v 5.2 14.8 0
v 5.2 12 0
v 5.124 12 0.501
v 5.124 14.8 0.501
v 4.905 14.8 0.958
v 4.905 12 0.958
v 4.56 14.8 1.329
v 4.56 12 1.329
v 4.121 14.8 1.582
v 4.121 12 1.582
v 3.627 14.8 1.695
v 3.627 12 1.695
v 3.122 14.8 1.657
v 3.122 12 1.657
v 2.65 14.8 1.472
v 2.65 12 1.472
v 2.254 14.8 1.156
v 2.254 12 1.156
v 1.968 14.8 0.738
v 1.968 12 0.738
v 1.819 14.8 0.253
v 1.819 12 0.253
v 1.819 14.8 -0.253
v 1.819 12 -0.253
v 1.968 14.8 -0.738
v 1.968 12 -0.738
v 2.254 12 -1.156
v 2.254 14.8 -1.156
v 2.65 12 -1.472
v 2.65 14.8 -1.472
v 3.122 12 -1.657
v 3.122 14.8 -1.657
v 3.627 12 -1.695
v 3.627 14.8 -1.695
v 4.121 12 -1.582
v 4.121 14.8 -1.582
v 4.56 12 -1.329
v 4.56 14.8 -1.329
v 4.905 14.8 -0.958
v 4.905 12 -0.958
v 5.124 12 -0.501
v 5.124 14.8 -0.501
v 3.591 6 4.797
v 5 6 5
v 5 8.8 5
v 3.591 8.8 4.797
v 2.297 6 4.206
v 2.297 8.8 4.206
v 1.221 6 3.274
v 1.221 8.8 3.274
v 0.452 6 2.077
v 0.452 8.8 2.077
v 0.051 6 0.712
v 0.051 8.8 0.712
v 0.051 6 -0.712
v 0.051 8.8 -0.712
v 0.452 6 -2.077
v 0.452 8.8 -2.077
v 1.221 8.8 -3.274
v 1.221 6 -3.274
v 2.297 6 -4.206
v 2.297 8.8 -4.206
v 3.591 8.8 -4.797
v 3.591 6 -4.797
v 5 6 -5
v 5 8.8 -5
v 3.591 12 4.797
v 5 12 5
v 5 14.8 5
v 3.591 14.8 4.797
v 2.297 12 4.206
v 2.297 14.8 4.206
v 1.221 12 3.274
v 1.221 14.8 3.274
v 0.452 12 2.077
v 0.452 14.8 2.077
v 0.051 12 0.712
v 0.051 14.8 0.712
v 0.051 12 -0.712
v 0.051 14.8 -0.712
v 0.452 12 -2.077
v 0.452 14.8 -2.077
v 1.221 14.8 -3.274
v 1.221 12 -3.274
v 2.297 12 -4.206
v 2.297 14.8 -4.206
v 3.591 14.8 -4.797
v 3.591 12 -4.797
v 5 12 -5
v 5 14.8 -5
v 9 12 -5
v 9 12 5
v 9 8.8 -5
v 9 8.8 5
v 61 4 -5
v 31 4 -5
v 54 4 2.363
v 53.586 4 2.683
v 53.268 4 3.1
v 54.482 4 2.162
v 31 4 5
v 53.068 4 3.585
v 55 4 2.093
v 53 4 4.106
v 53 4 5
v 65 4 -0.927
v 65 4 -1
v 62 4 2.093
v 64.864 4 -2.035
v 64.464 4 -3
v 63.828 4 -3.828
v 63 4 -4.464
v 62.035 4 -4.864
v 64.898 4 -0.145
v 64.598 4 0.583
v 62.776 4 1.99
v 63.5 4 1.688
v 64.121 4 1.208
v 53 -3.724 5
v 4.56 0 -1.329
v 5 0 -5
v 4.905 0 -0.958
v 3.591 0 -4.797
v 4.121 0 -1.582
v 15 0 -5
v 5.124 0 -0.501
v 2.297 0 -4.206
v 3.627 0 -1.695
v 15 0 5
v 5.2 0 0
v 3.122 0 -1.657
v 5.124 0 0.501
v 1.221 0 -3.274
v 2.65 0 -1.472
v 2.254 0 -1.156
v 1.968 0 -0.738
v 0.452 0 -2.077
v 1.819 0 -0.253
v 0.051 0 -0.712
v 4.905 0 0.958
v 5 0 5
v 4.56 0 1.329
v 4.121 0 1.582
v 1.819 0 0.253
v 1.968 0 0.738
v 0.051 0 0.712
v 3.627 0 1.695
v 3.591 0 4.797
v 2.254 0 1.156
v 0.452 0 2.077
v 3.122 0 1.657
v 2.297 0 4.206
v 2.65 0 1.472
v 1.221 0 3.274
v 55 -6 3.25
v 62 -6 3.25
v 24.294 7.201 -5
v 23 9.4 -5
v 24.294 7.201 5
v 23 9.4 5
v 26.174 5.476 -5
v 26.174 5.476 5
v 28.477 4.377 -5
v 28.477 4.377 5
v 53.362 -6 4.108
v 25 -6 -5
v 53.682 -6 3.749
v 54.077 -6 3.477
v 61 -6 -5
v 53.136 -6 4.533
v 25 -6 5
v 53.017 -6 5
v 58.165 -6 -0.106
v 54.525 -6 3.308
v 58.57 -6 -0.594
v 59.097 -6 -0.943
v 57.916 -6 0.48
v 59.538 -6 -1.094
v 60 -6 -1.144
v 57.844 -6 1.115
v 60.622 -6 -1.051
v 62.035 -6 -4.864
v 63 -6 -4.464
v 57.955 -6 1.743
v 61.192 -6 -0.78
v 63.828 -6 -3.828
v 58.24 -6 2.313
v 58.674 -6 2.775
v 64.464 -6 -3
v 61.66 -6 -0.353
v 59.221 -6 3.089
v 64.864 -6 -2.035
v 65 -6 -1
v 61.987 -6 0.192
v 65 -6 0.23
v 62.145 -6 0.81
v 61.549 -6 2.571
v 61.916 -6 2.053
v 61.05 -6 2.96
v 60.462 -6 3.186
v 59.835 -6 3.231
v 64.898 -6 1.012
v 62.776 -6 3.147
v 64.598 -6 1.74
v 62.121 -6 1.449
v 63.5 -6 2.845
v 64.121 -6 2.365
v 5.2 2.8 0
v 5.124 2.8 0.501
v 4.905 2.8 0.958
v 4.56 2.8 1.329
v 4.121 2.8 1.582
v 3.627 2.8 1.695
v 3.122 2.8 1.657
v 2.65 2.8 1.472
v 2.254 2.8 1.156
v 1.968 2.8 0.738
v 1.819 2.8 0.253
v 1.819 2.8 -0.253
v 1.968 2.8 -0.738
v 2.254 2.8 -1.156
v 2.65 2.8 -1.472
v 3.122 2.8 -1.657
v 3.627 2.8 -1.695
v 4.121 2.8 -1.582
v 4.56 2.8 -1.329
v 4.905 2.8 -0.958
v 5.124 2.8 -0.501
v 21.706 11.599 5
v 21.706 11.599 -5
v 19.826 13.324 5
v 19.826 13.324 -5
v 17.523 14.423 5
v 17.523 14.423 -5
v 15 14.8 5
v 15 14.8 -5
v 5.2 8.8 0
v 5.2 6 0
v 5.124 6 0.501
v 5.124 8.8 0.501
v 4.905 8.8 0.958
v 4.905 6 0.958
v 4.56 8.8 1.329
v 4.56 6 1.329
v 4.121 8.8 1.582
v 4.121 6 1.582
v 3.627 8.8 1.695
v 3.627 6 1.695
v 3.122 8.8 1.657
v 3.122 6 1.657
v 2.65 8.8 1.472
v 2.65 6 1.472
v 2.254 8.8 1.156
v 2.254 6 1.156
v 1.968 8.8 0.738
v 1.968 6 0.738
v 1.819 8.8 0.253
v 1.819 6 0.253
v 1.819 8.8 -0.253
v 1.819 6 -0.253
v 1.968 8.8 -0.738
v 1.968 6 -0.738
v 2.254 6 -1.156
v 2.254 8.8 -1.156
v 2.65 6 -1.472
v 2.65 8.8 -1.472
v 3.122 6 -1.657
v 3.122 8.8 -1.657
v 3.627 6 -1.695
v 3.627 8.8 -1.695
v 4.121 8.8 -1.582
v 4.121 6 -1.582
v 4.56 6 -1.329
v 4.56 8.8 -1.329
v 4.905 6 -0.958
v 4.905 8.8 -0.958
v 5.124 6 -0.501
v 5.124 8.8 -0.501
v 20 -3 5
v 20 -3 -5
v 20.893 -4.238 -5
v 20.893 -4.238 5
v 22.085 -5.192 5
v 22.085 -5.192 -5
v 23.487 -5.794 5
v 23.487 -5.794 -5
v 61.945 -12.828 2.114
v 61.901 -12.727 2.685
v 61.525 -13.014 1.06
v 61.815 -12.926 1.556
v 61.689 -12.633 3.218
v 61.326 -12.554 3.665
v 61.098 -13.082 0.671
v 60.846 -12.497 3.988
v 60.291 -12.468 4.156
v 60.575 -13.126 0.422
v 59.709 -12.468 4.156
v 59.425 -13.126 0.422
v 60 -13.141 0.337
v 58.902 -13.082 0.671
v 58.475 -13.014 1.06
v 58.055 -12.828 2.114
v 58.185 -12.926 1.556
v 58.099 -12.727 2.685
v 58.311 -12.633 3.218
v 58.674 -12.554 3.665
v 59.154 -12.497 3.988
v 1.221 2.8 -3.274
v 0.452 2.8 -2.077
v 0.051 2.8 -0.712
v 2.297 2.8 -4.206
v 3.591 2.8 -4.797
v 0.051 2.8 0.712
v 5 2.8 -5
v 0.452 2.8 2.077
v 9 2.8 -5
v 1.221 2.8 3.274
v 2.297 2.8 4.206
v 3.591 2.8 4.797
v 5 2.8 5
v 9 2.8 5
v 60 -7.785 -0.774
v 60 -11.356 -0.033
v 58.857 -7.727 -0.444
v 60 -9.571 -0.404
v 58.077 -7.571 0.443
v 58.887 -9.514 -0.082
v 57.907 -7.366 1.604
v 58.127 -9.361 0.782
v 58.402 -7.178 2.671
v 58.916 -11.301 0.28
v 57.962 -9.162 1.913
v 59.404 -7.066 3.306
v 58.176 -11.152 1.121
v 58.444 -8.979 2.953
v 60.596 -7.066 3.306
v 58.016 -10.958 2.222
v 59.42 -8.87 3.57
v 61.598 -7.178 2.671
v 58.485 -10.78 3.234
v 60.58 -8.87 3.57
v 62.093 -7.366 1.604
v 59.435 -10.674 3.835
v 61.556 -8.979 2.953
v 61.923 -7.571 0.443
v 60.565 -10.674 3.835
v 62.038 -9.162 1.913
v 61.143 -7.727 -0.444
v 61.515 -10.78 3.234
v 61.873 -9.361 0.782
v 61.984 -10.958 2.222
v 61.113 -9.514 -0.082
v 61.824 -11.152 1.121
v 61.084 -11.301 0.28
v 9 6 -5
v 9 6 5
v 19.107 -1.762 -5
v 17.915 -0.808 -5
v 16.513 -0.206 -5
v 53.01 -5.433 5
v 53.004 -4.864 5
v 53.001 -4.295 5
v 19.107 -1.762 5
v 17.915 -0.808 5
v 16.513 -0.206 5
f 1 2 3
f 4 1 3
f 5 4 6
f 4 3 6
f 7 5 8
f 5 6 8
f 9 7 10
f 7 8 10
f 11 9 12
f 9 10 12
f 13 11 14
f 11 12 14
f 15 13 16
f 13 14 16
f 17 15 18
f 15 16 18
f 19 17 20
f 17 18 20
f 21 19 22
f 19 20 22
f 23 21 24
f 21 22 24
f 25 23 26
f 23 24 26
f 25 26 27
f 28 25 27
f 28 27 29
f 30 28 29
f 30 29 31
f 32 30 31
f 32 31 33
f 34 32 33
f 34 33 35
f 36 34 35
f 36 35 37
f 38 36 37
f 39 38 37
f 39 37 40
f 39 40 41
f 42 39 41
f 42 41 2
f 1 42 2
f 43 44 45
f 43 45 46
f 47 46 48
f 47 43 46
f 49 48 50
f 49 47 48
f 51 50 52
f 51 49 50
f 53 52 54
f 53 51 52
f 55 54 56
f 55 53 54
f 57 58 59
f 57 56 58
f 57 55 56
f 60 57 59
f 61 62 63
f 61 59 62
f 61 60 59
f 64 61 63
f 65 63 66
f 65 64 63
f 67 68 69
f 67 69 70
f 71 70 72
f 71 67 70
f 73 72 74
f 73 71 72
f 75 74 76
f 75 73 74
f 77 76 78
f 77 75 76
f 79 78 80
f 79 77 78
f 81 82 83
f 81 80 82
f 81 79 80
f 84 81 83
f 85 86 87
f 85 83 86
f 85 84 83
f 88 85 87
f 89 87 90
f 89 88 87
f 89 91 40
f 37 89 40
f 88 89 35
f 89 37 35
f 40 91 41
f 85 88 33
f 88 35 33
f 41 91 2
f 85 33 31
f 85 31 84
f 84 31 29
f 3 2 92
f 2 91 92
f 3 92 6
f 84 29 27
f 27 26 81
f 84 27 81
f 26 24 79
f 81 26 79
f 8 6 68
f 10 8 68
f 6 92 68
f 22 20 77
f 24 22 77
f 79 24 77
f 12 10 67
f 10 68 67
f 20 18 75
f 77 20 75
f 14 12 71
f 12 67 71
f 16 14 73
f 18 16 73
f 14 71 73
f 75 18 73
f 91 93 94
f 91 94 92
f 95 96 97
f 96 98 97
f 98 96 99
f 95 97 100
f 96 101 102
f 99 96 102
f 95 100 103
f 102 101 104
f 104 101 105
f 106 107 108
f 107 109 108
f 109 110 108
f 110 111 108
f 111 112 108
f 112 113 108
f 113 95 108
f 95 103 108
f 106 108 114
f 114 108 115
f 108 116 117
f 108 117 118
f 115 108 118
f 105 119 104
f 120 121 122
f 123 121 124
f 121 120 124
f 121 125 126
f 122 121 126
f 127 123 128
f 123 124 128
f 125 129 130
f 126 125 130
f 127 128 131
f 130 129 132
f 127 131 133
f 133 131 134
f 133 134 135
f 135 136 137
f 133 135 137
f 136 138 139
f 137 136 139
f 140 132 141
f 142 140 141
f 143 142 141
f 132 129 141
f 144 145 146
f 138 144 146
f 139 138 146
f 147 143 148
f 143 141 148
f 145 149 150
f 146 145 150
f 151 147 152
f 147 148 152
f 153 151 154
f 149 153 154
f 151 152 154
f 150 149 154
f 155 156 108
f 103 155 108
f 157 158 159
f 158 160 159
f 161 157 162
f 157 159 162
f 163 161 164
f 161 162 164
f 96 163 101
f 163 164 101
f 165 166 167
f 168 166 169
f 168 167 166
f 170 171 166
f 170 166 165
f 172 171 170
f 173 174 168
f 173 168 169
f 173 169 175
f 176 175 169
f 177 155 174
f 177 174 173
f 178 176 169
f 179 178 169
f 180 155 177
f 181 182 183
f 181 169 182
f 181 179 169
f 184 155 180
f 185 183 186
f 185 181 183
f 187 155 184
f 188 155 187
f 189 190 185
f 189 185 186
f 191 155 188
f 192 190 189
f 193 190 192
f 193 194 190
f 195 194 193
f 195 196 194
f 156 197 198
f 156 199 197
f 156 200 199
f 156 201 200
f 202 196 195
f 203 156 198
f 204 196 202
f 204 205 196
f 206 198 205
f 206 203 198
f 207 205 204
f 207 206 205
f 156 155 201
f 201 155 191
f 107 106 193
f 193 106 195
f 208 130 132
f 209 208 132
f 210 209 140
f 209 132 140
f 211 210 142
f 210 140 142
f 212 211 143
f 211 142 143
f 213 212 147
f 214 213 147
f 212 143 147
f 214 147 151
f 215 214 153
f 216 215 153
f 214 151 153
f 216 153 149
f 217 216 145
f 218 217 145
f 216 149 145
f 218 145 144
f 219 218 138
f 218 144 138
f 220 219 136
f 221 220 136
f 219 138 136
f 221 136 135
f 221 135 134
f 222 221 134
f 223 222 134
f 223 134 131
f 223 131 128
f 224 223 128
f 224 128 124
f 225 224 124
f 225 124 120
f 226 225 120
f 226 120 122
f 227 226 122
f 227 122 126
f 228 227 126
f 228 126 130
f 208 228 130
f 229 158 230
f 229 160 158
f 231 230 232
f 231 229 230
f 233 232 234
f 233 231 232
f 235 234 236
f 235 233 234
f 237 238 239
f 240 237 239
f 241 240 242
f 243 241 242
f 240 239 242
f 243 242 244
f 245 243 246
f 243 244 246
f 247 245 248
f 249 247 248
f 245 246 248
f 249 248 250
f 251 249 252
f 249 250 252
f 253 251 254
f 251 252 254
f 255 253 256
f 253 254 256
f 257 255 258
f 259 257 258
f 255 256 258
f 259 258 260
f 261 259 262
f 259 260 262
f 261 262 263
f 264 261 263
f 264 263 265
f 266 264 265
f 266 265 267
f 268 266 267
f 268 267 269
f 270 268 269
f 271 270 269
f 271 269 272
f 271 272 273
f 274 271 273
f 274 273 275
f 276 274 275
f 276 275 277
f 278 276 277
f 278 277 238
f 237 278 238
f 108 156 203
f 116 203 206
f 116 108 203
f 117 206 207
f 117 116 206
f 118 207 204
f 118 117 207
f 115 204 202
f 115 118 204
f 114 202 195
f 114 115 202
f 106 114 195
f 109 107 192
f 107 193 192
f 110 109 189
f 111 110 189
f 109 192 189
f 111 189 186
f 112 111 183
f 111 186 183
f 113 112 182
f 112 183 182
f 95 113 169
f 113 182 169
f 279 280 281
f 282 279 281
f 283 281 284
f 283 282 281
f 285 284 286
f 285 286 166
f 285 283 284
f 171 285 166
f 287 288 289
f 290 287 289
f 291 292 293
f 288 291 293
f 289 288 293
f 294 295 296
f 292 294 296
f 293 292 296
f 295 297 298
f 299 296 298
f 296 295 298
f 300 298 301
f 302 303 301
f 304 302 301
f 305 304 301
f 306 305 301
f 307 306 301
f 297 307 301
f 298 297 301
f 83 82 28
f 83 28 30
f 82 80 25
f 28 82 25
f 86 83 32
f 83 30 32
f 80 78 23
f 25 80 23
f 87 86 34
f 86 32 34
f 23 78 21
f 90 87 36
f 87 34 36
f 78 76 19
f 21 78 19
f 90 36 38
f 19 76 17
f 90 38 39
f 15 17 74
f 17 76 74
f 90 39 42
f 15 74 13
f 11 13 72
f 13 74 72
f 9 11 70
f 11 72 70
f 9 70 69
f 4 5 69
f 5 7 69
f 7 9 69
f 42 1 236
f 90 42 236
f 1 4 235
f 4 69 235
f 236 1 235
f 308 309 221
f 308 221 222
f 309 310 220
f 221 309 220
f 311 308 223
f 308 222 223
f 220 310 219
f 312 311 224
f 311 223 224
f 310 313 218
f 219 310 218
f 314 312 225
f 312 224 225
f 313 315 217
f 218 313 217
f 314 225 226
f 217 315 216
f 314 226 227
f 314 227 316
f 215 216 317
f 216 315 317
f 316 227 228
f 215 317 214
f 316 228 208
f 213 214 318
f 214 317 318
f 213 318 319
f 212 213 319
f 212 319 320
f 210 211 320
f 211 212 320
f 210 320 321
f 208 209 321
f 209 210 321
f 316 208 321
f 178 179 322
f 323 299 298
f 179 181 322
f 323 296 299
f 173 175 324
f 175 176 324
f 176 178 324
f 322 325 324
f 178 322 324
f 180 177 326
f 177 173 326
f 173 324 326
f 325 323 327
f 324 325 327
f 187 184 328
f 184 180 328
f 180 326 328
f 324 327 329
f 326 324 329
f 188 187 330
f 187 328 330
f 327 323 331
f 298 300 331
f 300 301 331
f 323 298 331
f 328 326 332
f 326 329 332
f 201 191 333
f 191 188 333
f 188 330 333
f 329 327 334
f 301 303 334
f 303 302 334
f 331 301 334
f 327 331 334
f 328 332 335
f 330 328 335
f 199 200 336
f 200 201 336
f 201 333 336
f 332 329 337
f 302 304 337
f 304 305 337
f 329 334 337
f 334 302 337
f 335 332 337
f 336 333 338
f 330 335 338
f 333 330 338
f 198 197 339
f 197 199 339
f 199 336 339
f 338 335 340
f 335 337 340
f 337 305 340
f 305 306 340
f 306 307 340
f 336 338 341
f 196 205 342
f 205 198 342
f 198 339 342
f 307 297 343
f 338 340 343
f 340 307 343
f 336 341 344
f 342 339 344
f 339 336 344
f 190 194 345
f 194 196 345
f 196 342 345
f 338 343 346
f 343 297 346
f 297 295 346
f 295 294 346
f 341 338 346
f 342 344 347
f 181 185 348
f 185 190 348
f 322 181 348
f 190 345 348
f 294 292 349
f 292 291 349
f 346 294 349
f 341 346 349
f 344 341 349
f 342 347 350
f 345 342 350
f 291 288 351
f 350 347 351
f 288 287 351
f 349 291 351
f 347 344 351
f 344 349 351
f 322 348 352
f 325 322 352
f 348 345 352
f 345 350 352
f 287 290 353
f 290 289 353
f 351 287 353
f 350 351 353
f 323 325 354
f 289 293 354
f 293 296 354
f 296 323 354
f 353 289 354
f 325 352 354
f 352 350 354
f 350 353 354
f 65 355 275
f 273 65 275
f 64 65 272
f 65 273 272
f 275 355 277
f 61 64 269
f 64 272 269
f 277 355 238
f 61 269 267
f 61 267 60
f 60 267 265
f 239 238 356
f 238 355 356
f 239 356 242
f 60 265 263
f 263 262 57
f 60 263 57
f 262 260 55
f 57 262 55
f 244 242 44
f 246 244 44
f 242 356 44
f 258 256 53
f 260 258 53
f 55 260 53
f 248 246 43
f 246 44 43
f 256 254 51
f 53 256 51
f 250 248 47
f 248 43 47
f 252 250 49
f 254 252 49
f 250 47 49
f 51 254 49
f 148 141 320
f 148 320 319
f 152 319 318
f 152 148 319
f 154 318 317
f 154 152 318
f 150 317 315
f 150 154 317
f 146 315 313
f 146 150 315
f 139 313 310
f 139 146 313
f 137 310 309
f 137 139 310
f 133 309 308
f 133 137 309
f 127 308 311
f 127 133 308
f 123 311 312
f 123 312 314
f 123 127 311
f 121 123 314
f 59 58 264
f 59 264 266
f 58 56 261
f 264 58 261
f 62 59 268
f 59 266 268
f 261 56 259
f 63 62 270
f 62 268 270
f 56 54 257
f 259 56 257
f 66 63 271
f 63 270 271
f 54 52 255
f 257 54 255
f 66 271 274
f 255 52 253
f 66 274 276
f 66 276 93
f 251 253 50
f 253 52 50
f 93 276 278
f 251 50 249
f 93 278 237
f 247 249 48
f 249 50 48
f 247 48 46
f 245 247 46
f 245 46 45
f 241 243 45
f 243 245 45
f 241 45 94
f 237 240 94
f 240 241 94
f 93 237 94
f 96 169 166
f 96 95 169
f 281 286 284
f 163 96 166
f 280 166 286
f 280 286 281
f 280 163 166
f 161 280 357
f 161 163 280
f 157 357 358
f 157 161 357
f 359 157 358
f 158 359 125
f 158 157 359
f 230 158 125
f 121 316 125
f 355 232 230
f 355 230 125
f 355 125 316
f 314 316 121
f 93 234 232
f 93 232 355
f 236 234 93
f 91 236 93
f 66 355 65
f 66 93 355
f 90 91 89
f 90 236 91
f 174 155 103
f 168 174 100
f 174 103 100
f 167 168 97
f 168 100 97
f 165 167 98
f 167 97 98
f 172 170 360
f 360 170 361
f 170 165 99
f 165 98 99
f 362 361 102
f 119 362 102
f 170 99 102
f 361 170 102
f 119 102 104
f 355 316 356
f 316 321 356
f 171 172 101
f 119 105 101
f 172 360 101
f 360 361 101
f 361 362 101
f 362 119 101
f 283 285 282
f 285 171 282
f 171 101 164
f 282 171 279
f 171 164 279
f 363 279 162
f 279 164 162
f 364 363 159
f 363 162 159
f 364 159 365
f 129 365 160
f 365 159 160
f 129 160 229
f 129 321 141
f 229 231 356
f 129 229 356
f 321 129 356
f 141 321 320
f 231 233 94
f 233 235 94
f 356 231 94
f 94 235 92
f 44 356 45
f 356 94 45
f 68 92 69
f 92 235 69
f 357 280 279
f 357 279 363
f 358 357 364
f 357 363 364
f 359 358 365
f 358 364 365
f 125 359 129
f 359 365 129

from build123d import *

# Parameters (mm, degrees)
PAD008_DEPTH    = 5
POCKET013_DEPTH = 20.801
SKETCH027_R     = 1.7
POCKET014_DEPTH = 14.801
POCKET015_DEPTH = 12
FILLET007_R     = 3
FILLET008_R     = 2
FILLET009_R     = 4


with BuildPart() as part:
    # Sketch025 → Pad008 (new body, symmetric)
    with BuildSketch(Plane.XY):
        with BuildLine():
            Line((0, 0), (0, 2.8))
            Line((0, 2.8), (9, 2.8))
            Line((9, 2.8), (9, 6))
            Line((9, 6), (0, 6))
            Line((0, 6), (0, 8.8))
            Line((0, 8.8), (9, 8.8))
            Line((9, 8.8), (9, 12))
            Line((9, 12), (0, 12))
            Line((0, 12), (0, 14.8))
            Line((0, 14.8), (9, 14.8))
            Line((9, 14.8), (15, 14.8))
            ThreePointArc((23, 9.4), (19.8259714048, 13.3236613405), (15, 14.8))
            ThreePointArc((23, 9.4), (26.1740285952, 5.4763386595), (31, 4))
            Line((31, 4), (65, 4))
            Line((65, 4), (65, -6))
            Line((25, -6), (65, -6))
            ThreePointArc((20, -3), (22.0845240526, -5.1924599124), (25, -6))
            ThreePointArc((20, -3), (17.9154759474, -0.8075400876), (15, 0))
            Line((15, 0), (0, 0))
        make_face()
    extrude(amount=PAD008_DEPTH, both=True)

    # Sketch026 (on Face18 of Pad008) → Pocket013 (cut, through all)
    with BuildSketch(Plane.XZ.offset(6)):
        with BuildLine():
            ThreePointArc((5, 5), (0, 0), (5, -5))
            Line((5, -6), (5, -5))
            Line((-1, -6), (5, -6))
            Line((-1, 6), (-1, -6))
            Line((5, 6), (-1, 6))
            Line((5, 6), (5, 5))
        make_face()
    extrude(amount=-POCKET013_DEPTH, mode=Mode.SUBTRACT)

    # Sketch027 (on Face3 of Pocket013) → Pocket014 (cut, through all)
    with BuildSketch(Plane.XZ):
        with Locations((3.5, 0)):
            Circle(SKETCH027_R)
    extrude(amount=-POCKET014_DEPTH, mode=Mode.SUBTRACT)

    # Sketch028 (on DatumLine) → Revolution001 (revolve)
    with BuildSketch(Plane(origin=(60, 0, 0), x_dir=(0, -0.1736481777, -0.984807753), z_dir=(1, 0, 0))):
        Polygon((0, -5), (2.1902294727, -5), (1.95, -13), (0, -13), align=None)
    revolve(axis=Axis((60, 0, 0), (0, 0.984807753, -0.1736481777)))

    # Sketch029 (on Face23 of Revolution001) → Pocket015 (cut)
    with BuildSketch(Plane.YZ.offset(65)):
        Polygon((-6, 3.25), (6, 1.8615526279), (6, 6.8615526279), (-6, 6.8615526279), align=None)
    extrude(amount=-POCKET015_DEPTH, mode=Mode.SUBTRACT)

    # Fillet007
    fillet007_edges = [part.edges().sort_by_distance(p)[0] for p in [
        (65, -1, 2.67148),
    ]]
    fillet(fillet007_edges, radius=FILLET007_R)

    # Fillet008
    fillet008_edges = [part.edges().sort_by_distance(p)[0] for p in [
        (53, -1, 2.67148),
    ]]
    fillet(fillet008_edges, radius=FILLET008_R)

    # Fillet009
    fillet009_edges = [part.edges().sort_by_distance(p)[0] for p in [
        (65, -1, -5),
    ]]
    fillet(fillet009_edges, radius=FILLET009_R)


solid = part.part
